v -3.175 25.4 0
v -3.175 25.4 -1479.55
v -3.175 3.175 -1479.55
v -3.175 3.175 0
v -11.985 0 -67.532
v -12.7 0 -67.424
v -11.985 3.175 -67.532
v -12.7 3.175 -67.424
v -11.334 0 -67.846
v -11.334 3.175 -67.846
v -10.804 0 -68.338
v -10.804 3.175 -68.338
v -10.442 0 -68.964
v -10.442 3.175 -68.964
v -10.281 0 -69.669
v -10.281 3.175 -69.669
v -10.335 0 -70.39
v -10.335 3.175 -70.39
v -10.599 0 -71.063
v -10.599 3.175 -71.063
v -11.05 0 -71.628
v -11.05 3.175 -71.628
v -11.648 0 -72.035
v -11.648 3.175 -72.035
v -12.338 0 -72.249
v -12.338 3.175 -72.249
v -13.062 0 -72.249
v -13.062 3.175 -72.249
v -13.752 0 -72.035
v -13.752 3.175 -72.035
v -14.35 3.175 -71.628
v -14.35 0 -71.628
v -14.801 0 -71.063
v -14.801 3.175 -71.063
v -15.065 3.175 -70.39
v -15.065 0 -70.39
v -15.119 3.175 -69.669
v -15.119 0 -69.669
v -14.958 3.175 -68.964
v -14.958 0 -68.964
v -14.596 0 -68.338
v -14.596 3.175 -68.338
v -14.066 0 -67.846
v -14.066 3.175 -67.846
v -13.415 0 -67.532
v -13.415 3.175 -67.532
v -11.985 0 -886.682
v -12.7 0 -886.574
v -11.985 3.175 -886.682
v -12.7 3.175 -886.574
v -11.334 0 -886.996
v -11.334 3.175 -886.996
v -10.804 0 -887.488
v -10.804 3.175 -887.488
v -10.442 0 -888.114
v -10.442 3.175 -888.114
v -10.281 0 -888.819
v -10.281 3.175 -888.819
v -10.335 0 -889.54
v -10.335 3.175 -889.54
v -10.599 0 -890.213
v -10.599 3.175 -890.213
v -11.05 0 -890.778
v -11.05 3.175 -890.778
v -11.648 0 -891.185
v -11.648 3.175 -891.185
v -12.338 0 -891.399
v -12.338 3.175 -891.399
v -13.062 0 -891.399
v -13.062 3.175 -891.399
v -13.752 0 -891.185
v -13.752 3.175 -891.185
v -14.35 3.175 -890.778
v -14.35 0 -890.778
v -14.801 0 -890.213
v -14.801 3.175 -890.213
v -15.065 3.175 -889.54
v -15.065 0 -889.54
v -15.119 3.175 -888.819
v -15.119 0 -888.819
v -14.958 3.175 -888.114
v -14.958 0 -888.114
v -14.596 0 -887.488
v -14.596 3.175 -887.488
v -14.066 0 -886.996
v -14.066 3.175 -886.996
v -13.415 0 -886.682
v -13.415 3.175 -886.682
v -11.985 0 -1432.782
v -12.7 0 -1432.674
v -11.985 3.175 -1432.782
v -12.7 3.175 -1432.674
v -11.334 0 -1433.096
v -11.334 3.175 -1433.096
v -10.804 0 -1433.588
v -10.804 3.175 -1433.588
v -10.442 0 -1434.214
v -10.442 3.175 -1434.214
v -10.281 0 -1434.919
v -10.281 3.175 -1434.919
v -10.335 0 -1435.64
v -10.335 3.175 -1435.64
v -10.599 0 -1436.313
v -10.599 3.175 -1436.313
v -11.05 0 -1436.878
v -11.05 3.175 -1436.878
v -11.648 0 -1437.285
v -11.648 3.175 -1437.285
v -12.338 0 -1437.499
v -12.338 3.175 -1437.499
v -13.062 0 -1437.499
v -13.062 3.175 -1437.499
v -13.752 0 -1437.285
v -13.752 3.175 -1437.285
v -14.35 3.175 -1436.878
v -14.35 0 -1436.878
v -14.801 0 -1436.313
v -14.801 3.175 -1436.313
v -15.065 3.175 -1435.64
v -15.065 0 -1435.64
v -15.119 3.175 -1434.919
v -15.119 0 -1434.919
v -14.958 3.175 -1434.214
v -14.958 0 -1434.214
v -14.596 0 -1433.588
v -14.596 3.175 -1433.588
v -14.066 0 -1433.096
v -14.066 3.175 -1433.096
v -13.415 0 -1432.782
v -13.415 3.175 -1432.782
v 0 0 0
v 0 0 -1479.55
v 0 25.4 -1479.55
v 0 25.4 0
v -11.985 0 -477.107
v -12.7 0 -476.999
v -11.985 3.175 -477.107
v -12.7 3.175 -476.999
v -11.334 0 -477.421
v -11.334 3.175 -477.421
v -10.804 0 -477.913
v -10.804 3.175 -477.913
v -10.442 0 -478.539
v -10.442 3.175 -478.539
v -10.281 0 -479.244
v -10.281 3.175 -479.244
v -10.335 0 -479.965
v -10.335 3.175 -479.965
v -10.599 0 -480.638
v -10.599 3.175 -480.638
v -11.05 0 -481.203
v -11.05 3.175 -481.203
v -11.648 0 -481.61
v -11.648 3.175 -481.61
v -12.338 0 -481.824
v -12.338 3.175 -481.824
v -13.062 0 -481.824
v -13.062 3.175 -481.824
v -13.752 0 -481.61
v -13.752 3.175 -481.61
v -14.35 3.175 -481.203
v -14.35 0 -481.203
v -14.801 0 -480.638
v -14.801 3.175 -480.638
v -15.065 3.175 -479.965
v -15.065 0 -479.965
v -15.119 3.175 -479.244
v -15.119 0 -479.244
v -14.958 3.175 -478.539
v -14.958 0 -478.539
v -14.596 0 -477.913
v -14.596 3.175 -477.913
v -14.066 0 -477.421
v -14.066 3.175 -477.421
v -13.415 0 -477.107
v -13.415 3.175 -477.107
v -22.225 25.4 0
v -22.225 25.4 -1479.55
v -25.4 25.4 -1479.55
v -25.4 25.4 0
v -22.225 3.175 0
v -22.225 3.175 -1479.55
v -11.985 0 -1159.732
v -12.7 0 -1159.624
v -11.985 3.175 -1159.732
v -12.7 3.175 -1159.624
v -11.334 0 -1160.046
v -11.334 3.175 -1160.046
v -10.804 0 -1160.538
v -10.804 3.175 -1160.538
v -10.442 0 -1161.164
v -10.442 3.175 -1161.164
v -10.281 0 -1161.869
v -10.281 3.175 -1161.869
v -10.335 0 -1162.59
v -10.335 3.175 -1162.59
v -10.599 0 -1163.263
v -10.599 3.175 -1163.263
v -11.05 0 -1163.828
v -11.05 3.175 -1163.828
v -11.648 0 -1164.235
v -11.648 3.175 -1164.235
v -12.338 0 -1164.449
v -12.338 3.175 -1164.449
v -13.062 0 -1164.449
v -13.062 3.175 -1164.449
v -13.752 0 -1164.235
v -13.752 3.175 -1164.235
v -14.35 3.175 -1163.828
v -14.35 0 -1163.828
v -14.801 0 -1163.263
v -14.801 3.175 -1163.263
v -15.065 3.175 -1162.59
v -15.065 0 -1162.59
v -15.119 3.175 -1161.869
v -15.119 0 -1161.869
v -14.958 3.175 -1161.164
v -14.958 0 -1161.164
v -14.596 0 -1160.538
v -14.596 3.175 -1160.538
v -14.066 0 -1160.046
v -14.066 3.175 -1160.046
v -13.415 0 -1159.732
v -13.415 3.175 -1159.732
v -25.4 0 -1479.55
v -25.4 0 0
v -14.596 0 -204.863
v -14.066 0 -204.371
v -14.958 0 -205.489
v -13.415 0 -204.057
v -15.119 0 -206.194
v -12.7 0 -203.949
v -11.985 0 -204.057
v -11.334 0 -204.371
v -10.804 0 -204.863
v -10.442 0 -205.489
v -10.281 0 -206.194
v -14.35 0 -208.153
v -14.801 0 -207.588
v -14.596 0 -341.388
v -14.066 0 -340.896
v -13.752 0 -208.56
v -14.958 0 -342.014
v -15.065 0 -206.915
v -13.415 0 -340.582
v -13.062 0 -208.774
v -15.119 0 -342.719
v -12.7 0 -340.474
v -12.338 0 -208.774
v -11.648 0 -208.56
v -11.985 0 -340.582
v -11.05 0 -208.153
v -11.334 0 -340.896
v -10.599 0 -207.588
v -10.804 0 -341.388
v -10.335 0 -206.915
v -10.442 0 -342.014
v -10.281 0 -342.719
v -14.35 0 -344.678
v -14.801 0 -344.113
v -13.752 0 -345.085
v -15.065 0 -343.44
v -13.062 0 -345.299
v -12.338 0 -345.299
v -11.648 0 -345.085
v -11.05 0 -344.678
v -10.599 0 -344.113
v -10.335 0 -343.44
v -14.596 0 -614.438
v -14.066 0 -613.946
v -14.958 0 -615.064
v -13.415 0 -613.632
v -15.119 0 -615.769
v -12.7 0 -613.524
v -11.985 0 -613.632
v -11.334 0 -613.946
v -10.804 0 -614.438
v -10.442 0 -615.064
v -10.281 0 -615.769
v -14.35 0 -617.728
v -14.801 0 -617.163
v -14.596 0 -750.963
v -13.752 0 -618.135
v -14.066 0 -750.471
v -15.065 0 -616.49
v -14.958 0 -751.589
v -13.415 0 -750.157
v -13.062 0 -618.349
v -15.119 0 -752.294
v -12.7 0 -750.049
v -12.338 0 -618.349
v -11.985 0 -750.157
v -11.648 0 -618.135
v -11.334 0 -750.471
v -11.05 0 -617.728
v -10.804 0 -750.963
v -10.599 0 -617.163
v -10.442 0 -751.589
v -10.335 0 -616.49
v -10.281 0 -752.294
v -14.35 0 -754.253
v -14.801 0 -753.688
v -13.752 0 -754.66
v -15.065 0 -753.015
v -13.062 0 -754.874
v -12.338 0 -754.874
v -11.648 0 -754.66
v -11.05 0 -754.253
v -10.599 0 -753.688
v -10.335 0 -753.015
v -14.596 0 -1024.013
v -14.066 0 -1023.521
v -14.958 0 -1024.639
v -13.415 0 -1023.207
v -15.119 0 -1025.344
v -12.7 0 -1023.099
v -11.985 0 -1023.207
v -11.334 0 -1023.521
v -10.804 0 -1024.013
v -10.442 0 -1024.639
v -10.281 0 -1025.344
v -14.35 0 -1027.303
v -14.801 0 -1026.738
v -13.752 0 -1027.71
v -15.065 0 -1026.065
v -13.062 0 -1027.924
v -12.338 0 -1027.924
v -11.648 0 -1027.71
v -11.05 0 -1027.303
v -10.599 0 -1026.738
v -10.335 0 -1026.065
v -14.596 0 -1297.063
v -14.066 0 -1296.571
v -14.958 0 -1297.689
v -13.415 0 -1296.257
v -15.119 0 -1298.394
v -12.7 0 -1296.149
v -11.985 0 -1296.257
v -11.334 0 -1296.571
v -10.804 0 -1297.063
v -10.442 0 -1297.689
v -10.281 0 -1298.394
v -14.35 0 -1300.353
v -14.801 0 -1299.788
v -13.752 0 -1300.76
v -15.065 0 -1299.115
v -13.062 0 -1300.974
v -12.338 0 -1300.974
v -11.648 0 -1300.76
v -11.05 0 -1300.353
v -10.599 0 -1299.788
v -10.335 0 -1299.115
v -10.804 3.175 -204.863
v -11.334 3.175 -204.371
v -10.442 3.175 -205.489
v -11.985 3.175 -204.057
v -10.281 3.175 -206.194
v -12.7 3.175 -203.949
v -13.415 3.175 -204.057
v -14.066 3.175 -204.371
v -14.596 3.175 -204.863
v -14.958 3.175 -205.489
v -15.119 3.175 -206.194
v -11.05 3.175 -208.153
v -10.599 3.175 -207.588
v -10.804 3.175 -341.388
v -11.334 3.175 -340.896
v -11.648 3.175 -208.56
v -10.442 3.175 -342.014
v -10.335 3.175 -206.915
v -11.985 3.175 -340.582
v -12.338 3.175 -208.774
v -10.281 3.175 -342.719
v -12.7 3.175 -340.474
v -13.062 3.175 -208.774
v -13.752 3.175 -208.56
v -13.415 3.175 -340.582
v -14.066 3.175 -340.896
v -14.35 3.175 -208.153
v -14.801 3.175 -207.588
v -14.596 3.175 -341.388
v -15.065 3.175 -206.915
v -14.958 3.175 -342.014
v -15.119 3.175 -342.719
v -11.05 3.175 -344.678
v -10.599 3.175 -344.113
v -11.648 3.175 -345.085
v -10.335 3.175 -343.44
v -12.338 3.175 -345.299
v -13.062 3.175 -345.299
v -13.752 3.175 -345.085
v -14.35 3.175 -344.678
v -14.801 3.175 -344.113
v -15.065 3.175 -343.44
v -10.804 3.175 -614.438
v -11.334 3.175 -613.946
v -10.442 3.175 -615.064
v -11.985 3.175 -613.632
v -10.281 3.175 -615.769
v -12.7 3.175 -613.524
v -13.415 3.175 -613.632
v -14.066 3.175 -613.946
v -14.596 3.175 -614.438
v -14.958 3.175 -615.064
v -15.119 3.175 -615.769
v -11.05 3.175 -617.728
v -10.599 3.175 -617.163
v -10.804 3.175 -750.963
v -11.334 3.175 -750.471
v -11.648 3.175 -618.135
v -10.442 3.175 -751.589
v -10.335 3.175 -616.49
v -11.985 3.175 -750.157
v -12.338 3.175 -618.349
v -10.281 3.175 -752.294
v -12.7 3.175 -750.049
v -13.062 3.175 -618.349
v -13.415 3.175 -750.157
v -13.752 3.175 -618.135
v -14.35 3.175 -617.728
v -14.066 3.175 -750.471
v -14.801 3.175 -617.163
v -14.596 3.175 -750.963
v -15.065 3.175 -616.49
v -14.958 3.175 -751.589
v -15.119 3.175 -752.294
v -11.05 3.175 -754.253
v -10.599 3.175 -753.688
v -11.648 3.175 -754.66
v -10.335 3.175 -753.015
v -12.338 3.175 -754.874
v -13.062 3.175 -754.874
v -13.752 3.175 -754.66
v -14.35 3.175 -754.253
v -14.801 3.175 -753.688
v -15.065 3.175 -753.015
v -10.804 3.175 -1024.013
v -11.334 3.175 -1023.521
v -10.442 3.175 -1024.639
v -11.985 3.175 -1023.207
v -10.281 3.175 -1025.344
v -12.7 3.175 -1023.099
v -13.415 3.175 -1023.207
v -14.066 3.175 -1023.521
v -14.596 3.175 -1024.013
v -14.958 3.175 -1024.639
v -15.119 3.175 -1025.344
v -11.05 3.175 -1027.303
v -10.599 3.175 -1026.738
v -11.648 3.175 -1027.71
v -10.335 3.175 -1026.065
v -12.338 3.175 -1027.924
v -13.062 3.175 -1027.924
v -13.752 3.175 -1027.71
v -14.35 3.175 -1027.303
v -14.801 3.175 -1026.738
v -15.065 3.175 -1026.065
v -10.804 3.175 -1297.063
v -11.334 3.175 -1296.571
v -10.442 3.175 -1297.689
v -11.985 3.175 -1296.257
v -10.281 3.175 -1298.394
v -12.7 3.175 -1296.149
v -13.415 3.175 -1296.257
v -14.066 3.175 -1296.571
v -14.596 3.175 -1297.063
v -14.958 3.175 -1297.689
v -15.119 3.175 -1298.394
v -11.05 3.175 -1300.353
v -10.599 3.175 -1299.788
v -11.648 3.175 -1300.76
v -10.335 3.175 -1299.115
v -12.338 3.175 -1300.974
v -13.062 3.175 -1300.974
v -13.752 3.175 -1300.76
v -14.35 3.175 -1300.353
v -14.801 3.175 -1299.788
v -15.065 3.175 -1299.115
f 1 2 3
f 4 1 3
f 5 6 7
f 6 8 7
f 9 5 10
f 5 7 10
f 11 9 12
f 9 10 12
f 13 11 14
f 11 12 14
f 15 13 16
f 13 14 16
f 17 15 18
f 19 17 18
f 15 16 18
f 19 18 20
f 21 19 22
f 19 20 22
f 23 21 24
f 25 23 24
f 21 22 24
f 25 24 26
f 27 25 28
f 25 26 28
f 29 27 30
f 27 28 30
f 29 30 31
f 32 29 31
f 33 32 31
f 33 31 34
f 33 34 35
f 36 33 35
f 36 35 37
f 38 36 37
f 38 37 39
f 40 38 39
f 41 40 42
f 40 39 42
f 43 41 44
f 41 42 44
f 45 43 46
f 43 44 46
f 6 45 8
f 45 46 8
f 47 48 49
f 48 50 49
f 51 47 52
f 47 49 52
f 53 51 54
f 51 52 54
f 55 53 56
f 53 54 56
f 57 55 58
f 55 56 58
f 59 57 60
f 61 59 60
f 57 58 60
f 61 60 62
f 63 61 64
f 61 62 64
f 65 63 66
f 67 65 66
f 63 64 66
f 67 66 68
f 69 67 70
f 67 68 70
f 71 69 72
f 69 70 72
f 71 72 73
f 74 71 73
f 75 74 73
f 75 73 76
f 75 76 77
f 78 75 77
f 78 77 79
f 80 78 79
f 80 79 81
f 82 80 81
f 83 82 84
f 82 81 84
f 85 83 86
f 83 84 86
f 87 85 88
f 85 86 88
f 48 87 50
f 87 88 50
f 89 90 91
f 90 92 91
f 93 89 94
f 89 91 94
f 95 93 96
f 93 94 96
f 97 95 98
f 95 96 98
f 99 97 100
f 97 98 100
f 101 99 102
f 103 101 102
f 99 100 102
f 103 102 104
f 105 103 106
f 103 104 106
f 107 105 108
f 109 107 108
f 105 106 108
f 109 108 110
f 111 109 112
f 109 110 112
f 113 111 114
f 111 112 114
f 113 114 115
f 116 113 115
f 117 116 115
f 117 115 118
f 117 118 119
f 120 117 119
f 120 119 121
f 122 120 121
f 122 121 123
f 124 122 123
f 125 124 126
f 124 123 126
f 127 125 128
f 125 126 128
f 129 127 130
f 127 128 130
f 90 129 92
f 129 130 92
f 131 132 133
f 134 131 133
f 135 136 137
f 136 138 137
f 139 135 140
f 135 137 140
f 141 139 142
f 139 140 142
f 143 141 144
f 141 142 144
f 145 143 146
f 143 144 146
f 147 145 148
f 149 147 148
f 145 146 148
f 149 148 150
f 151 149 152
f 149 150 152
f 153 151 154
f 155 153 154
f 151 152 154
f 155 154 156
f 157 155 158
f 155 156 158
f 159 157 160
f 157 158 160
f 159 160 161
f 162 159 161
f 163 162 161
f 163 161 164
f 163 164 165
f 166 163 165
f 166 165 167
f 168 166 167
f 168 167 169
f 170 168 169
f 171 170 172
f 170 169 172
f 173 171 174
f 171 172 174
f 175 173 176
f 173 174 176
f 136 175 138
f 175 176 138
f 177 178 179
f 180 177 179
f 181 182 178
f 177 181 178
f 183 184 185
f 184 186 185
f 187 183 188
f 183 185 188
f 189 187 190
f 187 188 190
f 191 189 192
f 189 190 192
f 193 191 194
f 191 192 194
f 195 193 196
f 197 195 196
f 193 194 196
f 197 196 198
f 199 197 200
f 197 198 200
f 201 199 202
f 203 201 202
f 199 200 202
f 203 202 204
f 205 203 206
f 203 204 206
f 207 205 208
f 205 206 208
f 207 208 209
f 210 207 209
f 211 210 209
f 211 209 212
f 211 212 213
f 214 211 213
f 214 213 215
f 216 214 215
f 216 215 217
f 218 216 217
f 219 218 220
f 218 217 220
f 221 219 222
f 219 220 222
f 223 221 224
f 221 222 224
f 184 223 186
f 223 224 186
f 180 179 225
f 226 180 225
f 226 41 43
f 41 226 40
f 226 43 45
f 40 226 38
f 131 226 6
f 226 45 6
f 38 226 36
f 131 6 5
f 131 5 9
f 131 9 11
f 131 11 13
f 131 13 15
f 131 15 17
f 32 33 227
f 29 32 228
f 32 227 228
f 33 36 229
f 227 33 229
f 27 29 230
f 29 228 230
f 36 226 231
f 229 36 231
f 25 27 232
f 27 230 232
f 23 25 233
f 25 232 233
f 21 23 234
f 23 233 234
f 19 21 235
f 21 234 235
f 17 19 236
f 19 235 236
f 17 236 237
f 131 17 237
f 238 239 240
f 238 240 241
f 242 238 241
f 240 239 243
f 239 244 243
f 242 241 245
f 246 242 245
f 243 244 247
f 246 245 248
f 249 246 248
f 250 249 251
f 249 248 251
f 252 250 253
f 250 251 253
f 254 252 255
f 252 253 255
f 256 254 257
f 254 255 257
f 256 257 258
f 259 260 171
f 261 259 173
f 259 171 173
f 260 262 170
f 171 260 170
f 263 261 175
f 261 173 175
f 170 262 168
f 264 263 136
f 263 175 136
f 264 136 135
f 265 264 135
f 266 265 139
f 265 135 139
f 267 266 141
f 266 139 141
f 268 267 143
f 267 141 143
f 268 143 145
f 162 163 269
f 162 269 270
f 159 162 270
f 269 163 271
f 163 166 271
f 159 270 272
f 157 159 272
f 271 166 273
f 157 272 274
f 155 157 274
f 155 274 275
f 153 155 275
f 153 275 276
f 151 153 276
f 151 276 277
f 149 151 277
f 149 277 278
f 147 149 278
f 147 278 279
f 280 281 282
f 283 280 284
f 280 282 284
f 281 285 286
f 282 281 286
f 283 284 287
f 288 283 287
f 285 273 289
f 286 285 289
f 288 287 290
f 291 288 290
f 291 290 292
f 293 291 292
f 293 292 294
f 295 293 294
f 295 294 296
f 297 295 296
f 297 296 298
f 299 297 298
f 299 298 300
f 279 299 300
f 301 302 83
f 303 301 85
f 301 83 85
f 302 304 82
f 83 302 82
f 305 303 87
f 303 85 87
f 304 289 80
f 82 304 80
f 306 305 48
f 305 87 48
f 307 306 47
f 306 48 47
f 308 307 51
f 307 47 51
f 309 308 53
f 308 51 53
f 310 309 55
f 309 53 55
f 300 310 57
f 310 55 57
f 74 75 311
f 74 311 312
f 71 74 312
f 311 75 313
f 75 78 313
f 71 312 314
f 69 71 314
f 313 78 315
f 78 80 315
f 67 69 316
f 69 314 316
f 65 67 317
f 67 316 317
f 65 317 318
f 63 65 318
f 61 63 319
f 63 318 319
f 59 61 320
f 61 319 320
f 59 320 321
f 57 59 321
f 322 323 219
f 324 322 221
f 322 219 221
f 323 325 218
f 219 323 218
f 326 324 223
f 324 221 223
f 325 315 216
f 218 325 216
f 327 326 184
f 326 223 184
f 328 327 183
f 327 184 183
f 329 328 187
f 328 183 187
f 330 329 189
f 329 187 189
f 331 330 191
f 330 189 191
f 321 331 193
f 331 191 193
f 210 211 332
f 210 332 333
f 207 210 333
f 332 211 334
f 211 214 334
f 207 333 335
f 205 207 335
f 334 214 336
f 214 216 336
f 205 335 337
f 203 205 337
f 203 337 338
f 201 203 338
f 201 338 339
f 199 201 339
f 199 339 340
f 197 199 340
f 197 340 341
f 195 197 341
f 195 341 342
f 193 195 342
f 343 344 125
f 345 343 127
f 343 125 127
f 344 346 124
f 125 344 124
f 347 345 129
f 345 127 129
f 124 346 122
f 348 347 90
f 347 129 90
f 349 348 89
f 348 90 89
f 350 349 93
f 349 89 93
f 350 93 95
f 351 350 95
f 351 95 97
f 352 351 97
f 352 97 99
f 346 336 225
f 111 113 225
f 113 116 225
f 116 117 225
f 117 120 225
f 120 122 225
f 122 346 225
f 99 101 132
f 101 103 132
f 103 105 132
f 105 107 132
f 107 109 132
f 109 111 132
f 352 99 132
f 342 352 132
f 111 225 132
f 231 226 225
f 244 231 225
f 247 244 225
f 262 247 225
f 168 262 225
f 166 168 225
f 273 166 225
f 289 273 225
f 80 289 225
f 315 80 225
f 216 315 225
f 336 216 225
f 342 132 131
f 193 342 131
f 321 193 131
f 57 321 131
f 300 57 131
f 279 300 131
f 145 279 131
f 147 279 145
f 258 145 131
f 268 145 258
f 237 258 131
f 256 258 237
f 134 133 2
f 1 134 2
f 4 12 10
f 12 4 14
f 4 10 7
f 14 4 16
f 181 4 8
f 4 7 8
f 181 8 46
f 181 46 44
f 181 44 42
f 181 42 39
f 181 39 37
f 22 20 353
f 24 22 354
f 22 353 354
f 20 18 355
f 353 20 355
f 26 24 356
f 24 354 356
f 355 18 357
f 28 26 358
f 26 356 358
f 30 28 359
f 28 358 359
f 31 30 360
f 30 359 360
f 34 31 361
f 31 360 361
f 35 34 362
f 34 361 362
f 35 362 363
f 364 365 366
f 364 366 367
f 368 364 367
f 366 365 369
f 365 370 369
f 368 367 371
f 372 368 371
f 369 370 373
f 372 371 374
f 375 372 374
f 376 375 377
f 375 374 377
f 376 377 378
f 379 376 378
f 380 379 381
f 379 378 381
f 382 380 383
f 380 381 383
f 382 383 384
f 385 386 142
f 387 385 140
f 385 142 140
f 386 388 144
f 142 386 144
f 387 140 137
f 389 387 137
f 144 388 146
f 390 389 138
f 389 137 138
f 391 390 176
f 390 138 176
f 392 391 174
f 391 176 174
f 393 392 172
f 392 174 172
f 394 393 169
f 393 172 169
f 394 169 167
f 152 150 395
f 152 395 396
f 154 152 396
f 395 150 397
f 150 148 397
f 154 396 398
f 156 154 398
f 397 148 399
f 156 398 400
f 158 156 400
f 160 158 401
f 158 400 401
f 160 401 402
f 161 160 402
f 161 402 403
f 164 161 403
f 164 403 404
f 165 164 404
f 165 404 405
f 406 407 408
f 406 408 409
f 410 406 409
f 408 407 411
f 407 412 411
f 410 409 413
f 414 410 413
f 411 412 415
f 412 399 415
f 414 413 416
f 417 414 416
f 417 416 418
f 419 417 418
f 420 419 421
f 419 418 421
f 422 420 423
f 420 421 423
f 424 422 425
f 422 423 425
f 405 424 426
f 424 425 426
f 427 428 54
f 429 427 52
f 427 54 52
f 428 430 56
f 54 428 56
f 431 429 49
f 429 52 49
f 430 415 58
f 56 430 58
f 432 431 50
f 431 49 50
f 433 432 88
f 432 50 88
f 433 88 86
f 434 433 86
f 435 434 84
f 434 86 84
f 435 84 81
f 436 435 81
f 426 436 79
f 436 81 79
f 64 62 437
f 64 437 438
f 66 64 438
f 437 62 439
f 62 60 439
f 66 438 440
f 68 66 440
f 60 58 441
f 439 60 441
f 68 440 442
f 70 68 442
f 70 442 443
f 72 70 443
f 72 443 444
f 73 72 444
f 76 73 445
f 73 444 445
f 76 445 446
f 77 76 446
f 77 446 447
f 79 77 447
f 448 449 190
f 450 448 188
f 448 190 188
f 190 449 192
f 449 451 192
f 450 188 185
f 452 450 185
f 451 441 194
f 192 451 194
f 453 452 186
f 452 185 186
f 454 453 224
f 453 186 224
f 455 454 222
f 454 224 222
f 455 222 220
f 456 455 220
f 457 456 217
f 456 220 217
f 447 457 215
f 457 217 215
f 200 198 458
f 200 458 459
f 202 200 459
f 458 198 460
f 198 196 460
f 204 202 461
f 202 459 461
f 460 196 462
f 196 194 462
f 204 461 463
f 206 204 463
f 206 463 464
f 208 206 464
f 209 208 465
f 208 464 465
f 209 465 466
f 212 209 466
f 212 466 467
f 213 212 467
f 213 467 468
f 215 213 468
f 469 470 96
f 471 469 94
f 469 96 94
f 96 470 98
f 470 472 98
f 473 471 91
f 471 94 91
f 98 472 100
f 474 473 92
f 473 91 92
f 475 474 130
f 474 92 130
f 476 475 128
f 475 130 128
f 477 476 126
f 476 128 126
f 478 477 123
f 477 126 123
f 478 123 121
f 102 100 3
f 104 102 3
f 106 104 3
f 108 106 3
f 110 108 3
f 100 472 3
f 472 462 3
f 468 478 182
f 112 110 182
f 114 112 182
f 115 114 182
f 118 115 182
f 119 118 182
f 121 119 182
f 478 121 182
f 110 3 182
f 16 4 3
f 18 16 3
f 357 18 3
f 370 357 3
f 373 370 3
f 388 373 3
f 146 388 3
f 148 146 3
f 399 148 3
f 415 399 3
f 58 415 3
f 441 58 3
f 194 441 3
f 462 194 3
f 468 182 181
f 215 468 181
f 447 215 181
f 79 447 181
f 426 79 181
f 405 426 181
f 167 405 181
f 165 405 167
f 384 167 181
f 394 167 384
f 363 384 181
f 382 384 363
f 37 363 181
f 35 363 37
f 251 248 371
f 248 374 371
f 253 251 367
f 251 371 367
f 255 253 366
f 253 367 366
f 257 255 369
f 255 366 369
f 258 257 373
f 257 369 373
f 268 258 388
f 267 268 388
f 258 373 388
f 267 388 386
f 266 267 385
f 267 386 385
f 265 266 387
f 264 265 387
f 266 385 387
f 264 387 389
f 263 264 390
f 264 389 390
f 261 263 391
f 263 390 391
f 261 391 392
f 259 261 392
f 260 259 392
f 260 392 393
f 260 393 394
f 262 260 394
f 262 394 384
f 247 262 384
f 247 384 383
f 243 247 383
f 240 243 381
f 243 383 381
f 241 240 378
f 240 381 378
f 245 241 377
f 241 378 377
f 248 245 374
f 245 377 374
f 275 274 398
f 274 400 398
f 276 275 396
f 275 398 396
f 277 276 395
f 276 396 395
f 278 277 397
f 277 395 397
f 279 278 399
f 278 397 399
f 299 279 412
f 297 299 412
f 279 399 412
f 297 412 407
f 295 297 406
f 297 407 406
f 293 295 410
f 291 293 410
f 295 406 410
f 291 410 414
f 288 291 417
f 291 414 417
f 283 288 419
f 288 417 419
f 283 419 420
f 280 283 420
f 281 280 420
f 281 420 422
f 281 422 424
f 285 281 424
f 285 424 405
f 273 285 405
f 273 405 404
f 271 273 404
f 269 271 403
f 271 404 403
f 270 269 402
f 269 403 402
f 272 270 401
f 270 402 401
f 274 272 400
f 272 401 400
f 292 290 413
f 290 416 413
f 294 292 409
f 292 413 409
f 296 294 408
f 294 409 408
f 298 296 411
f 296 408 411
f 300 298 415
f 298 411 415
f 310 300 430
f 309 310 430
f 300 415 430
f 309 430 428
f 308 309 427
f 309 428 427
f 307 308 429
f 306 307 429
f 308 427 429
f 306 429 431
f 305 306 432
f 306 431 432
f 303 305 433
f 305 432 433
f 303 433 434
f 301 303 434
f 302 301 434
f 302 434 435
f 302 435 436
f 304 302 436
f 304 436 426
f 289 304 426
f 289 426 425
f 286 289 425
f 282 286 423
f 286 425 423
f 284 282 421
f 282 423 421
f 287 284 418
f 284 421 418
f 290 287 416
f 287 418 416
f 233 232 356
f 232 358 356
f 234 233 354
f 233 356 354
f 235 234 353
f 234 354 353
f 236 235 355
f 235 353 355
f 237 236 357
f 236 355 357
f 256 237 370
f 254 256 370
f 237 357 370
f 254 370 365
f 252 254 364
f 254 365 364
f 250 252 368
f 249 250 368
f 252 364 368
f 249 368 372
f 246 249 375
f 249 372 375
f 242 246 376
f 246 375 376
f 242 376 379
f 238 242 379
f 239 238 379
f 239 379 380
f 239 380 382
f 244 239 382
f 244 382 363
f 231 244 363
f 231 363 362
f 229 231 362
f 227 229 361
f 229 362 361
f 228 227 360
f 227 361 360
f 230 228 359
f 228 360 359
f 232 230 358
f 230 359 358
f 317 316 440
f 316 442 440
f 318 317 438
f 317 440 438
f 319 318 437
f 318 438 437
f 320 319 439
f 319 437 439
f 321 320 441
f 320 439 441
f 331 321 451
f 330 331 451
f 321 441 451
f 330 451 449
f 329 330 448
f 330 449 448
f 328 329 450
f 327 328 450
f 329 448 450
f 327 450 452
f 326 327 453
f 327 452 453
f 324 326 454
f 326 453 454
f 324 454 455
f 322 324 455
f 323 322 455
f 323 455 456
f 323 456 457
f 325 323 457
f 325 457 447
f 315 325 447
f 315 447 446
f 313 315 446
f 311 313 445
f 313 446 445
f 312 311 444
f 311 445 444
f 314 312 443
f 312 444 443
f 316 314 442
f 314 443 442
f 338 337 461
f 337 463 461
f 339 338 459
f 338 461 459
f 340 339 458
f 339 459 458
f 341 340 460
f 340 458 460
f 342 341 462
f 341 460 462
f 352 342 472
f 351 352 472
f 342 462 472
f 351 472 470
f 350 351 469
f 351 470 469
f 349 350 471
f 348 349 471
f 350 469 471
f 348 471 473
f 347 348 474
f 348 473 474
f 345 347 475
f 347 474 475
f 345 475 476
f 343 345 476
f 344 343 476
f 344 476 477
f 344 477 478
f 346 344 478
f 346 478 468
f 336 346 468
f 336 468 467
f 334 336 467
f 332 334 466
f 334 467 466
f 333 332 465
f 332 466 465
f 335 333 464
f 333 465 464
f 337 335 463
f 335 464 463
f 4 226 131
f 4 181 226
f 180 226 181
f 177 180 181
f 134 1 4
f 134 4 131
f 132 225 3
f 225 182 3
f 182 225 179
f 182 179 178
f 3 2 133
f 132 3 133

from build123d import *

# Parameters (mm, degrees)
LOFT1_START        = -1479.55
LOFT1_DEPTH        = 1479.55
SKETCH3_R          = 2.4257
CUT_EXTRUDE1_DEPTH = 7.62
LPATTERN1_COUNT    = 11
LPATTERN1_PITCH    = 136.525


# Read off the part's stored shape, not the designer's step: Loft1
with BuildPart() as part:
    # Loft1 outline → Loft1 (new body)
    with BuildSketch(Plane.XY.offset(LOFT1_START)):
        Polygon((0, 0), (0, 25.4), (-3.175, 25.4), (-3.175, 3.175), (-22.225, 3.175), (-22.225, 25.4), (-25.4, 25.4), (-25.4, 0), align=None)
    extrude(amount=LOFT1_DEPTH)

    # Sketch3 → Cut-Extrude1 (cut, symmetric)
    with BuildSketch(Plane(origin=(0, 0, 0), x_dir=(1, 0, 0), z_dir=(0, 1, 0))):
        with Locations(Location((-12.7, 69.85, 0), (0, 0, 270))):
            Circle(SKETCH3_R)
    cut_extrude1 = extrude(amount=CUT_EXTRUDE1_DEPTH, both=True, mode=Mode.SUBTRACT)

    # LPattern1: Cut-Extrude1 ×11
    with Locations(*[(0, 0, -i * LPATTERN1_PITCH) for i in range(1, LPATTERN1_COUNT)]):
        add(cut_extrude1, mode=Mode.SUBTRACT)


solid = part.part
